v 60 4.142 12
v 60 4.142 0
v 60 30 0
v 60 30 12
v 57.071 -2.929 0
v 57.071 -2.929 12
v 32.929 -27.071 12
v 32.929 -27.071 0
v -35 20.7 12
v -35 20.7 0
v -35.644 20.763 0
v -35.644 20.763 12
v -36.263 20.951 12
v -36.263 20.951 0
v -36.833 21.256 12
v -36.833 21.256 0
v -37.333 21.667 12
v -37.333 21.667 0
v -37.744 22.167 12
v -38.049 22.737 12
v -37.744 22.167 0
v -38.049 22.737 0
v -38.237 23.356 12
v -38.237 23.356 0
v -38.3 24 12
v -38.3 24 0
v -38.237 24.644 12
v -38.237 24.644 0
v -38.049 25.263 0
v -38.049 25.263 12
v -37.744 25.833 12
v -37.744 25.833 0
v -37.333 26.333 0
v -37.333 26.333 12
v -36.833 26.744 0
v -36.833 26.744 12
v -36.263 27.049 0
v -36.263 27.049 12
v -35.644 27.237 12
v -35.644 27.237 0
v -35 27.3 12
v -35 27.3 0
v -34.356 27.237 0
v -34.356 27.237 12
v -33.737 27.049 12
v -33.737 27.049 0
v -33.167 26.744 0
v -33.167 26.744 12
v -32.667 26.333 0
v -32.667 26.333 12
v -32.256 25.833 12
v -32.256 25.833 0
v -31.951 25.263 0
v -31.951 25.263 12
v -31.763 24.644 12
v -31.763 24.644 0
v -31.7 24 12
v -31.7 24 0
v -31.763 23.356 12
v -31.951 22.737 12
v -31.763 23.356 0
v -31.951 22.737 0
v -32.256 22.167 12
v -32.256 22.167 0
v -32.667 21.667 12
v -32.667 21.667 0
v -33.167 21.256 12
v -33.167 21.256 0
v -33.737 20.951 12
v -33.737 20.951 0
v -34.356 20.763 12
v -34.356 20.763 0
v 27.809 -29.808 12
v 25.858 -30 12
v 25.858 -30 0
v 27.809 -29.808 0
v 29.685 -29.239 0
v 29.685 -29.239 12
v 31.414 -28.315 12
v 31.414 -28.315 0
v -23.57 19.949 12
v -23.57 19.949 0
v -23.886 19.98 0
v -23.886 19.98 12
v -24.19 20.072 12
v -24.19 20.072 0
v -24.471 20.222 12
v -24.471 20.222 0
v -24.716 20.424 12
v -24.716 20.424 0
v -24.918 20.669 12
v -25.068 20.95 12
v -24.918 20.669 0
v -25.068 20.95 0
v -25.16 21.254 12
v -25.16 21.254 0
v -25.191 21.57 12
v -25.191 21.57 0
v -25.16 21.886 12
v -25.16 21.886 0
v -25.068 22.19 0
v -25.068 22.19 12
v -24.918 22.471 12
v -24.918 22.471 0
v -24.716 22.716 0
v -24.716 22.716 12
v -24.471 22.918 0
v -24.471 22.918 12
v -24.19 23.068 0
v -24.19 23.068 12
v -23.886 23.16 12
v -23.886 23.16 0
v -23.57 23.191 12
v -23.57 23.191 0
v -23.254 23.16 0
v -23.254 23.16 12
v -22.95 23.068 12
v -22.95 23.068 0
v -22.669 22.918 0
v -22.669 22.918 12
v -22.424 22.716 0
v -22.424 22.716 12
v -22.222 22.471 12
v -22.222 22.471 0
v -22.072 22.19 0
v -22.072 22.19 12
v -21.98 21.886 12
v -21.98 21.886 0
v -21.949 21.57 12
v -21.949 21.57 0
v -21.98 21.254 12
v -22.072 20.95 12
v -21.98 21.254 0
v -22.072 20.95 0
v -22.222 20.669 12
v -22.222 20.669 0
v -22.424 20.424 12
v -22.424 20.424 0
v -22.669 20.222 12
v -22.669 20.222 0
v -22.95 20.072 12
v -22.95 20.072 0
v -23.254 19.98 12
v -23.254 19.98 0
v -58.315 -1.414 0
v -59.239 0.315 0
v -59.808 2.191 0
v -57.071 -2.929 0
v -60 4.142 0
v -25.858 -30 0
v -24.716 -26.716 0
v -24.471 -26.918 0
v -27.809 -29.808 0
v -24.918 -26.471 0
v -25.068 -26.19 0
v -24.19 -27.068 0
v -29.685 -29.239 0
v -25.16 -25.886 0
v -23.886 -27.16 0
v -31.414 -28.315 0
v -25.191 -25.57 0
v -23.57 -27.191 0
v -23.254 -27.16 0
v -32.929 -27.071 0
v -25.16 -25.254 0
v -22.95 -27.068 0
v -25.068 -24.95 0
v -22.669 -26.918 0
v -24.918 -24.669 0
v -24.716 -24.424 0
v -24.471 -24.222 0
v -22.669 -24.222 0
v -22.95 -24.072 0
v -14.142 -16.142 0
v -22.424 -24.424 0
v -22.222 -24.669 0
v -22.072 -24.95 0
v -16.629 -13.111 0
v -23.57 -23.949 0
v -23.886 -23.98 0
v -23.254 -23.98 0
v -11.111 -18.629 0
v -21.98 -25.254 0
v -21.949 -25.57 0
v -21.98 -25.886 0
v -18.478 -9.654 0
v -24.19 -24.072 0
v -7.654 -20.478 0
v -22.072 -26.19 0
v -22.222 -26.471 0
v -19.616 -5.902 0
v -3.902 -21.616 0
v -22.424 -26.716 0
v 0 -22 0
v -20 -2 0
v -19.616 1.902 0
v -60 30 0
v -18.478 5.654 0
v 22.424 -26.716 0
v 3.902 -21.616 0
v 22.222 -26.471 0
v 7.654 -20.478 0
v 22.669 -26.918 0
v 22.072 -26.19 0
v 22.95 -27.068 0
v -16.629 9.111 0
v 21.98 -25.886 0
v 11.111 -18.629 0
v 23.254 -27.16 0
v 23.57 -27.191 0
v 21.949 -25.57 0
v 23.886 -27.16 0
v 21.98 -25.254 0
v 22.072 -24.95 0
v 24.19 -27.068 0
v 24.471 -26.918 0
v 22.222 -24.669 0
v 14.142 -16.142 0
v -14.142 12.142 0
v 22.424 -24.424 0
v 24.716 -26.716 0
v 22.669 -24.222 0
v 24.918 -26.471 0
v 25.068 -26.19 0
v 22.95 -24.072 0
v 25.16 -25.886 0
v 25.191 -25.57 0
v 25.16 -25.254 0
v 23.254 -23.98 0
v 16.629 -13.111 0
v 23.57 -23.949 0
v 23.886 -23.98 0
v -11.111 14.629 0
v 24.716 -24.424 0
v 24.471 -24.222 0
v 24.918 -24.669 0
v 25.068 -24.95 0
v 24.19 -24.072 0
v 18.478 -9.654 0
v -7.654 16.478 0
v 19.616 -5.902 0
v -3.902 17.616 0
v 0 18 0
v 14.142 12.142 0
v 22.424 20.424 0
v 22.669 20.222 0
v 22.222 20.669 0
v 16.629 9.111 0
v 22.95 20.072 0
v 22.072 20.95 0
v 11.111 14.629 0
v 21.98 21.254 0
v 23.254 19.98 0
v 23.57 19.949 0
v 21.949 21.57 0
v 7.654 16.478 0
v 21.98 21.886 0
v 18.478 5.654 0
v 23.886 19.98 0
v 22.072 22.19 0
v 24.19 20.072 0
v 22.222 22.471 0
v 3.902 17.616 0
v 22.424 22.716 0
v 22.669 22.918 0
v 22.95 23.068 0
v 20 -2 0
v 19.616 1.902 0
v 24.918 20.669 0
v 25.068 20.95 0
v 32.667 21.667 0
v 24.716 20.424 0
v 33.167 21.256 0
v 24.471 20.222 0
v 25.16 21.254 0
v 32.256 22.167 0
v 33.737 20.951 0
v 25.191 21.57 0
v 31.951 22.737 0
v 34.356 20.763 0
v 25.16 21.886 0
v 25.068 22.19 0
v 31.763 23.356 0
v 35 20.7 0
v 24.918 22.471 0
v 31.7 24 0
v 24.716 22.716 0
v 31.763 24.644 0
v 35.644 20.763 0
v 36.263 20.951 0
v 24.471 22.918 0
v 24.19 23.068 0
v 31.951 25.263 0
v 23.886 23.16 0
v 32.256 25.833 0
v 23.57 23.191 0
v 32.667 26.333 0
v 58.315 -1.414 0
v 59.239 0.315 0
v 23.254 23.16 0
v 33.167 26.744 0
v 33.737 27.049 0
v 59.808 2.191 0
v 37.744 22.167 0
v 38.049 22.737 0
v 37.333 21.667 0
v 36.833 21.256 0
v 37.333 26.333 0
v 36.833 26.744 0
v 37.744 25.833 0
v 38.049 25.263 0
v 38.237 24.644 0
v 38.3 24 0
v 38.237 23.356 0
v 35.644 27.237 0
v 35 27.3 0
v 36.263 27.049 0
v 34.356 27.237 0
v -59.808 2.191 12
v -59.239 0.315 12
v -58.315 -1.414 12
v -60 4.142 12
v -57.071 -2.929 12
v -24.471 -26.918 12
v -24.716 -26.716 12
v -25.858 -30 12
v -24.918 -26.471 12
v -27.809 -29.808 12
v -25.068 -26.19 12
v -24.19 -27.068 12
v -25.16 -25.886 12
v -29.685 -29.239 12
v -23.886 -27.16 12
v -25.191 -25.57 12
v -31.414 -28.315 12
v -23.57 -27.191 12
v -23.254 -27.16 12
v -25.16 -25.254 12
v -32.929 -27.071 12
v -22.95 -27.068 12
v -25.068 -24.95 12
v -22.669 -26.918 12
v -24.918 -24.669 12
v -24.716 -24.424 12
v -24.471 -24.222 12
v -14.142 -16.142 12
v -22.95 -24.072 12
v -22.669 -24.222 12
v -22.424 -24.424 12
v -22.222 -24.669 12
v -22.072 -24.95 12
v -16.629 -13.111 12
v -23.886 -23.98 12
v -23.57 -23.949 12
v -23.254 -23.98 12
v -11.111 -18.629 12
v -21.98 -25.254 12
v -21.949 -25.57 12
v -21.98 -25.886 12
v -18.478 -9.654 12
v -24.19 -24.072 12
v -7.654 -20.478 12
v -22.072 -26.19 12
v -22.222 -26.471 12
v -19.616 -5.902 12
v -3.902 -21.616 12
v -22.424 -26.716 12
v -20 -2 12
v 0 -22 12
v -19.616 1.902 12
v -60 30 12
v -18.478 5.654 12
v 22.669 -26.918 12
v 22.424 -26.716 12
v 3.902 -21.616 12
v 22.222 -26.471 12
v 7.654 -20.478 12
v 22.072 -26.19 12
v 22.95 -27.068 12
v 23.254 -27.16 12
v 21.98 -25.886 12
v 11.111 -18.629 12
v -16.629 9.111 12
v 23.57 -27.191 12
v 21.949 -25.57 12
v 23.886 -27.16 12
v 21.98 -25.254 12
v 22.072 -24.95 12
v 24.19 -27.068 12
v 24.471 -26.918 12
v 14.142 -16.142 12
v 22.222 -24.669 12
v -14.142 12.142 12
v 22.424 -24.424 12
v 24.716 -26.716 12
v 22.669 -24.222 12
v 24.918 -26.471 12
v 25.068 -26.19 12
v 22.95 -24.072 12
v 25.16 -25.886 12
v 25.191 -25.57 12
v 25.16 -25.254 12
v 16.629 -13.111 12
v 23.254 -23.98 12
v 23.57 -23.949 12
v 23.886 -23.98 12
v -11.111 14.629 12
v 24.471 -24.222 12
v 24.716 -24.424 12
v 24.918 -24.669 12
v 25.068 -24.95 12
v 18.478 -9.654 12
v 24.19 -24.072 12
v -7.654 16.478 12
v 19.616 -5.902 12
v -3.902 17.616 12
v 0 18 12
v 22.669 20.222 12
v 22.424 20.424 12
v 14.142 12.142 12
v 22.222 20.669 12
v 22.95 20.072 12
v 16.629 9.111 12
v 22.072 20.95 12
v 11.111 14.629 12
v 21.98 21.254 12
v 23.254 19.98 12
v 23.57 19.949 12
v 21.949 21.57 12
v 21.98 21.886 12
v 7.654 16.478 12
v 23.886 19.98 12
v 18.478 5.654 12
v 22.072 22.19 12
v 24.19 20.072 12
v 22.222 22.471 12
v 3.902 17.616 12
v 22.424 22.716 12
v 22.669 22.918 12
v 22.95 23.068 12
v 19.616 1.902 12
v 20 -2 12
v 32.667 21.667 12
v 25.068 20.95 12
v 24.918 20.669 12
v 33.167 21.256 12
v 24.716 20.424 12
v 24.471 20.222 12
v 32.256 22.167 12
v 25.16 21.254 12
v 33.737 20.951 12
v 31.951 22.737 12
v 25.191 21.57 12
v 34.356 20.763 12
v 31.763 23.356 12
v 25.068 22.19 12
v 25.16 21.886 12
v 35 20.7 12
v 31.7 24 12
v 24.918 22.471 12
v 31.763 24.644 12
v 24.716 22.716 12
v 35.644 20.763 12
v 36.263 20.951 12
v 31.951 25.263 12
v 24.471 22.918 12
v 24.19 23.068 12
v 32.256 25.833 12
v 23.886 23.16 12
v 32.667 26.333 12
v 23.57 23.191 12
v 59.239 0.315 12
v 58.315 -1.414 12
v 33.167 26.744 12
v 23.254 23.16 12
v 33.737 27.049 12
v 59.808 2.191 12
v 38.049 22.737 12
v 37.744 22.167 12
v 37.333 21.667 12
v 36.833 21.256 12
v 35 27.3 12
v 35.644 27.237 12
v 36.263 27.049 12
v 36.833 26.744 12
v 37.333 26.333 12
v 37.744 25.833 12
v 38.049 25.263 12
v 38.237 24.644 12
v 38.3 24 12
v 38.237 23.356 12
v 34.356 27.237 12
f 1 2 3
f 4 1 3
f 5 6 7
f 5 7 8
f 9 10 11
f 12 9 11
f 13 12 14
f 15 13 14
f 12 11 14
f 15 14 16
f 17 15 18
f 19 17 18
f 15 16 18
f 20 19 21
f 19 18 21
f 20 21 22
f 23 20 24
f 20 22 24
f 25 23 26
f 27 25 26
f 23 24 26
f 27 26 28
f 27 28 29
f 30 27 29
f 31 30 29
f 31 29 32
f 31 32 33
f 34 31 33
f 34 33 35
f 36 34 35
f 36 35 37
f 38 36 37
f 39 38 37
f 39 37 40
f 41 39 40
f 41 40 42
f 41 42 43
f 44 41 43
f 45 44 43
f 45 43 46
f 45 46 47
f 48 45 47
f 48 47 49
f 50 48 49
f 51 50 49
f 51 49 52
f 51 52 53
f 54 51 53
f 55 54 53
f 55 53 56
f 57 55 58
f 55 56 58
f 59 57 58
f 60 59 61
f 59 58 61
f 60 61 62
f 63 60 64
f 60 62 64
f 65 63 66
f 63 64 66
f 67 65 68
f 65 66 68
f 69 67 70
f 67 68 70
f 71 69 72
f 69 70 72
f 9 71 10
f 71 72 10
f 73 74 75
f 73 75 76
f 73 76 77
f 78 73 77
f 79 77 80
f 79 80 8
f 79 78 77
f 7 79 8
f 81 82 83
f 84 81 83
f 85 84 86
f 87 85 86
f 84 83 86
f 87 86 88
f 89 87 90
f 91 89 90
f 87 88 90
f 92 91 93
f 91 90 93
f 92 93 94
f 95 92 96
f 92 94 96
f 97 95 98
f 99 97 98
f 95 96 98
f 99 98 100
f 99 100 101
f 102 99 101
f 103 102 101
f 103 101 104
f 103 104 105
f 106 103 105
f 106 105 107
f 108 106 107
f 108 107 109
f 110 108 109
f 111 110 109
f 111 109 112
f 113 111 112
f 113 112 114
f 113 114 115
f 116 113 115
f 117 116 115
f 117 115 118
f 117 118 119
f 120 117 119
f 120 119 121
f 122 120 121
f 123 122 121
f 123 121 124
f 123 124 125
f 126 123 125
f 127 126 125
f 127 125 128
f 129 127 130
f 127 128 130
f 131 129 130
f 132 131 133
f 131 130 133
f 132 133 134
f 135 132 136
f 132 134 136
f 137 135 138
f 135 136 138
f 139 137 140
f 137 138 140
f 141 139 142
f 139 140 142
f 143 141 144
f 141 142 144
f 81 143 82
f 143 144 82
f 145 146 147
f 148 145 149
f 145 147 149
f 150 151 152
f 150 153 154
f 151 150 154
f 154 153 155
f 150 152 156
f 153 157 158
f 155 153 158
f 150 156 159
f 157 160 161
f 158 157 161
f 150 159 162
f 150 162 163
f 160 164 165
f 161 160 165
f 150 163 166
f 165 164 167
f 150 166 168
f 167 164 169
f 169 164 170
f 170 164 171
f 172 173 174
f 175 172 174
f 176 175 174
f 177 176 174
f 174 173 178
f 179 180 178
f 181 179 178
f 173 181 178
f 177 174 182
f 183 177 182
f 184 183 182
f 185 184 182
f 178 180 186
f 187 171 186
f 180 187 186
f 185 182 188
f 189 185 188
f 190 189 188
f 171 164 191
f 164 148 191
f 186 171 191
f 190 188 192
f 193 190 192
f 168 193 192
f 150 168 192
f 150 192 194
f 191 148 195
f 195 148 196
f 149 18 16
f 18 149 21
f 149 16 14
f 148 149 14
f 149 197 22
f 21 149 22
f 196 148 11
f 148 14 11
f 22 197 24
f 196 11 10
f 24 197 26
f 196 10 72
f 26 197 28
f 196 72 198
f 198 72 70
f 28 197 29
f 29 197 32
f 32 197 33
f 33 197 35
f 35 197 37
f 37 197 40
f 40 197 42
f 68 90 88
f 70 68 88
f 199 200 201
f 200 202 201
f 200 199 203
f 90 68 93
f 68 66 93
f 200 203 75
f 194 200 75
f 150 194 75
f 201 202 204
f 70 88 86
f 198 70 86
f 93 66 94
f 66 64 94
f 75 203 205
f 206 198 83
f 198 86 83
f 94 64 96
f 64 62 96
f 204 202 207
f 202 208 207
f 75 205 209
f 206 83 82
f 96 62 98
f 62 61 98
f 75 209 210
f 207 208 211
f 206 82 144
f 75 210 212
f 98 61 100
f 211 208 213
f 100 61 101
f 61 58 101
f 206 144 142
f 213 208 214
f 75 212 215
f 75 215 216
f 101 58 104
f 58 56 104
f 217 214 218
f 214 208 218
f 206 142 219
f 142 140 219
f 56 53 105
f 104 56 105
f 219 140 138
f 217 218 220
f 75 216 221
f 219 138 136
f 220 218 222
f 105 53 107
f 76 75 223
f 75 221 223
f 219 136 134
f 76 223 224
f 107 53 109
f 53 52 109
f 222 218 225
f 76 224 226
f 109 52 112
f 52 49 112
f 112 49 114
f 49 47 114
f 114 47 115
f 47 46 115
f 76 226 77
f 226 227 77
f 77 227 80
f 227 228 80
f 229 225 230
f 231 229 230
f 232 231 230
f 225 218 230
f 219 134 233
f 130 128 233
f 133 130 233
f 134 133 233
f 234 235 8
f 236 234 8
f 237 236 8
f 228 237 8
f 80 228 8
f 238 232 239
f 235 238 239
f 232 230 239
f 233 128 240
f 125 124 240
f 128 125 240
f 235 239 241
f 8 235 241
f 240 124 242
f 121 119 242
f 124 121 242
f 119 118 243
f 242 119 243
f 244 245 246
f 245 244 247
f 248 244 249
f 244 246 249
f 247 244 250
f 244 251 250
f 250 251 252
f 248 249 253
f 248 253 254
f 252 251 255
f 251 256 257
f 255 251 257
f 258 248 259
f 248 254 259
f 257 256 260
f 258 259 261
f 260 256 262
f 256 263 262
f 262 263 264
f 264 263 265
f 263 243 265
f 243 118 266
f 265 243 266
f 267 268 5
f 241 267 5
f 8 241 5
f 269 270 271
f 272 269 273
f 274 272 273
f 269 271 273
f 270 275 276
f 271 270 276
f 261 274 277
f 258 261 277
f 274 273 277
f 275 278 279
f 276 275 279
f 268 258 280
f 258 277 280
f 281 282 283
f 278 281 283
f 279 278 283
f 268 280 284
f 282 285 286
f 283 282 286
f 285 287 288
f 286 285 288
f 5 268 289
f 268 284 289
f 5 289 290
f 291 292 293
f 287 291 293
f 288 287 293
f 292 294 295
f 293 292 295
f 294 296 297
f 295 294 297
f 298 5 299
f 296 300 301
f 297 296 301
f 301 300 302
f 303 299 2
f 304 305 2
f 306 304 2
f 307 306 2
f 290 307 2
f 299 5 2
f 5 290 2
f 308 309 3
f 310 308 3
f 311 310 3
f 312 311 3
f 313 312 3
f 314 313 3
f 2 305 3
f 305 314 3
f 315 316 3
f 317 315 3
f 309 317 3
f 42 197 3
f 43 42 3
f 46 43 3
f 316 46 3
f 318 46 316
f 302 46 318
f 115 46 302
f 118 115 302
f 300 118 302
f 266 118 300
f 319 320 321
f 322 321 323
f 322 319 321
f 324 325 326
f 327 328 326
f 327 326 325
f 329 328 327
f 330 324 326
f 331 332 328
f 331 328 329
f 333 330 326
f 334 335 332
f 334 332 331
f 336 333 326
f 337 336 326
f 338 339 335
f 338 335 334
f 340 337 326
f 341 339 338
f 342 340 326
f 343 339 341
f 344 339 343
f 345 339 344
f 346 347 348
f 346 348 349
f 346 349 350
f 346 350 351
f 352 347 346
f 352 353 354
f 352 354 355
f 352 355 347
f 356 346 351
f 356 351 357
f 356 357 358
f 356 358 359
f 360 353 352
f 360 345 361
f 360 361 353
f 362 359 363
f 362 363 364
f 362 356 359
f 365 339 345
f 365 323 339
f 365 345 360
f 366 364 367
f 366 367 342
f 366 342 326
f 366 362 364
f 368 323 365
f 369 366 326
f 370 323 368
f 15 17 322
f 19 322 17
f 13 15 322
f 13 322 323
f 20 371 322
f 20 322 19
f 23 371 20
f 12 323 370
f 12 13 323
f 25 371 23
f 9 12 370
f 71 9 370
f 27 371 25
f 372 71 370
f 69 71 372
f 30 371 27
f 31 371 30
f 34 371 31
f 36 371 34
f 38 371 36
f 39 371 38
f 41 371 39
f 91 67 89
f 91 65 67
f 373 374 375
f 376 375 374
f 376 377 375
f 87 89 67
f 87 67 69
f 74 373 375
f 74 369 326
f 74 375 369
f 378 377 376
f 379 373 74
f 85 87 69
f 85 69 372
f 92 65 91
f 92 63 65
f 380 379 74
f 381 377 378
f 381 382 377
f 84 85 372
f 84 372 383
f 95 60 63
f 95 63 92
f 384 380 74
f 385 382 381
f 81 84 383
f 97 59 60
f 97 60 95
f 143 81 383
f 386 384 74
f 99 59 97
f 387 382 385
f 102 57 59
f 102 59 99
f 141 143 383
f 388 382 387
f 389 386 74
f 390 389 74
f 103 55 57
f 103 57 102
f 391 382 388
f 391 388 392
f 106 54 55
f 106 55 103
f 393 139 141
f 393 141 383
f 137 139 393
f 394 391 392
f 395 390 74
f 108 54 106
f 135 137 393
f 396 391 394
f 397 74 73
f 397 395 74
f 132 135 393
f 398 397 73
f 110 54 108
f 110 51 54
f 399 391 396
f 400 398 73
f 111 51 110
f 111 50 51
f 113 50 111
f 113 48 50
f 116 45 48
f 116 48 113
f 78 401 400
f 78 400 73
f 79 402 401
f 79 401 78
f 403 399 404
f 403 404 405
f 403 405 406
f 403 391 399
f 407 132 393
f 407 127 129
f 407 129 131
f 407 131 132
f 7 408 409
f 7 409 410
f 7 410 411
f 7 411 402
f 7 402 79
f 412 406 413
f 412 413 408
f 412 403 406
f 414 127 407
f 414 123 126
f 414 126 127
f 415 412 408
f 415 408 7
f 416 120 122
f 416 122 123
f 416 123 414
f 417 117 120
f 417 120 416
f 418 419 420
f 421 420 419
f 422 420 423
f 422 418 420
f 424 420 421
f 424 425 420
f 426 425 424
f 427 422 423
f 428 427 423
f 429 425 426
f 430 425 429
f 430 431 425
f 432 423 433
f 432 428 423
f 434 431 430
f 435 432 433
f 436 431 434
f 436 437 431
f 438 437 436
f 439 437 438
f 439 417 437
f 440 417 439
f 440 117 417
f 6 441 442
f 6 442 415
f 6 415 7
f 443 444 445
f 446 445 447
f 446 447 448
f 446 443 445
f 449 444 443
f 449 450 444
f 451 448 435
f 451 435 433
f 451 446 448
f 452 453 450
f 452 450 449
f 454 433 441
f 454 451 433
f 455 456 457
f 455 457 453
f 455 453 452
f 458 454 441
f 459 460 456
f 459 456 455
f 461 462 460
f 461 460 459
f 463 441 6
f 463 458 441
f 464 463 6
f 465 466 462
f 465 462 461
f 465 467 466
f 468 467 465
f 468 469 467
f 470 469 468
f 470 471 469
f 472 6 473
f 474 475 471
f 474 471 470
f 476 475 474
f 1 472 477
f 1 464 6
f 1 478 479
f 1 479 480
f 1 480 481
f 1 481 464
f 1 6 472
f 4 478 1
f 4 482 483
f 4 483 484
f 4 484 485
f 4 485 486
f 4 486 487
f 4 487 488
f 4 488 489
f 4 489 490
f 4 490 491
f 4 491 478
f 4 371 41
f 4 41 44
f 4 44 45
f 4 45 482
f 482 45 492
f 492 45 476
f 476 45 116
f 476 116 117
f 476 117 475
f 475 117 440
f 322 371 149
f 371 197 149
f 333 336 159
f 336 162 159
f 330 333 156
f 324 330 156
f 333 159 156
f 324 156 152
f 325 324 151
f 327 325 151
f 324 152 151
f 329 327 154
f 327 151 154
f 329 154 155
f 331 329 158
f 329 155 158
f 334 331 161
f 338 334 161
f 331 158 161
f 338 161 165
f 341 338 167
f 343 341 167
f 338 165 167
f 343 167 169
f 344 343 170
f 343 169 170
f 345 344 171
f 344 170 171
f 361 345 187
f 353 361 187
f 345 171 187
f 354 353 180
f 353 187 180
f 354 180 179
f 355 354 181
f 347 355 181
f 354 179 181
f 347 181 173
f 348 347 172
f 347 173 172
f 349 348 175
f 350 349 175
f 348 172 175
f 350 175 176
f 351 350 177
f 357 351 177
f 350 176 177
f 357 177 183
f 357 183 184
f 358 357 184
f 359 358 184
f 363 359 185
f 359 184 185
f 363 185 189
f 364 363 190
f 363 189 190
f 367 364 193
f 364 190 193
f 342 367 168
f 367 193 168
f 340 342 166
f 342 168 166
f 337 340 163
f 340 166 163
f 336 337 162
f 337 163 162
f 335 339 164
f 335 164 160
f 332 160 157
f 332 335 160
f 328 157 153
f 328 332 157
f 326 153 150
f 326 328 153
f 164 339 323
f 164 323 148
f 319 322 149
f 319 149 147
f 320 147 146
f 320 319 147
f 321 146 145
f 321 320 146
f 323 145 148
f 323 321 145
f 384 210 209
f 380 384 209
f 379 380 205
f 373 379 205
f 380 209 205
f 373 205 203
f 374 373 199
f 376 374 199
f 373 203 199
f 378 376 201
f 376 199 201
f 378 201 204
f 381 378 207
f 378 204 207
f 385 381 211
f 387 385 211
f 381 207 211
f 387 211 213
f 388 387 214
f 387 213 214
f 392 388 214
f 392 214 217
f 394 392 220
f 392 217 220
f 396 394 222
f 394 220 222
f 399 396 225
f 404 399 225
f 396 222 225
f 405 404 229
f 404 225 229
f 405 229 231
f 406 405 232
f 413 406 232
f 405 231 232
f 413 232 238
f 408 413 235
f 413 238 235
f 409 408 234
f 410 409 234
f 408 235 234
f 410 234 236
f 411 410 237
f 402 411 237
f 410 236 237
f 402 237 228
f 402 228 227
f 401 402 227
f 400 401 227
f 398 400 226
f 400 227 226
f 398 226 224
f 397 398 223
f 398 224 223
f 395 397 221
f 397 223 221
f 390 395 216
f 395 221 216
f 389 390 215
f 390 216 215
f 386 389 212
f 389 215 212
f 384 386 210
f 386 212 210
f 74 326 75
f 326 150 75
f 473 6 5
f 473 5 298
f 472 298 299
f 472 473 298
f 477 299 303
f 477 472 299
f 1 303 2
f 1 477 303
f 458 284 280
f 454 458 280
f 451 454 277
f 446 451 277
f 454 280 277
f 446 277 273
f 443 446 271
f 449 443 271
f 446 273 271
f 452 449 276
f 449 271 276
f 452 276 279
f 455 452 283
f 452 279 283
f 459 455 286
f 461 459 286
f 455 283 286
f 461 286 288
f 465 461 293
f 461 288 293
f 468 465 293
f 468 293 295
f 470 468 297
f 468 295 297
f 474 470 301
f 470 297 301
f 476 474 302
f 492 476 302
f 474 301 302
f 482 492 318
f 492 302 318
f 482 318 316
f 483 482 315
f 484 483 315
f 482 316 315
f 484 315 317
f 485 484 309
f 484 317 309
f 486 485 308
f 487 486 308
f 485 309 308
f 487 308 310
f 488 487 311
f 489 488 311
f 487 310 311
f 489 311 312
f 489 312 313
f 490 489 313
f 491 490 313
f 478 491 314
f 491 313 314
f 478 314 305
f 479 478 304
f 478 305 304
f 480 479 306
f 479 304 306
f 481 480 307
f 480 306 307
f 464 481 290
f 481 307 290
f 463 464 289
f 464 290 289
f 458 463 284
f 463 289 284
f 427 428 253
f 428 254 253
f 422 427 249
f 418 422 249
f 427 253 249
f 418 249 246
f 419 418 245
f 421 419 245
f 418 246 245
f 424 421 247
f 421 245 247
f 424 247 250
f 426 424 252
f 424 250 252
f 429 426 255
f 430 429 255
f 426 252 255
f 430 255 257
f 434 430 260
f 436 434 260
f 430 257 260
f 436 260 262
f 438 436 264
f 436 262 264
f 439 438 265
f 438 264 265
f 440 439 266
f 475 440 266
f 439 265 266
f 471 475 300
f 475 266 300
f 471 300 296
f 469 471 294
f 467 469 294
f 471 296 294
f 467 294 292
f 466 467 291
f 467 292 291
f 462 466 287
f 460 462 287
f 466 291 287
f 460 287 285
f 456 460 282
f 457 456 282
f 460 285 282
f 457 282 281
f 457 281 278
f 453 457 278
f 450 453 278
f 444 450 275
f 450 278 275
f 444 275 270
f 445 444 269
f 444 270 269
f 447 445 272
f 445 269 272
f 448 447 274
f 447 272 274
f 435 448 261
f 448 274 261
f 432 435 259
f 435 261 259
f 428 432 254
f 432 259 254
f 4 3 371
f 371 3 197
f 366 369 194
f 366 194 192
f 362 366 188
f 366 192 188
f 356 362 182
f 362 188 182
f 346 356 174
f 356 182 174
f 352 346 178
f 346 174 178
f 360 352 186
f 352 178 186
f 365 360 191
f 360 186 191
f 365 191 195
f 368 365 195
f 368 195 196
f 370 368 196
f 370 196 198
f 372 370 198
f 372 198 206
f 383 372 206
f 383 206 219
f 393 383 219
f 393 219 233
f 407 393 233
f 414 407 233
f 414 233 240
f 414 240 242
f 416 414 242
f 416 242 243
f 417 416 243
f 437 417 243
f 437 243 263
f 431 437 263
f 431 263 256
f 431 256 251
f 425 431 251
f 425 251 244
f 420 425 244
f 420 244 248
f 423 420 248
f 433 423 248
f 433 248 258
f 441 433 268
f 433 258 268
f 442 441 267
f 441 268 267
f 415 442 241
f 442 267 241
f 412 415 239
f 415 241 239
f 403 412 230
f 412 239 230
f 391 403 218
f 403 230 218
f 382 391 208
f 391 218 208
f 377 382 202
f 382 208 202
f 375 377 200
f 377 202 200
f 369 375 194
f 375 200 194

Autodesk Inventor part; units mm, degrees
ref_plane "YZ Plane" through (0, 0, 0) normal (1, 0, 0) x (0, 1, 0)
ref_plane "XZ Plane" through (0, 0, 0) normal (0, 1, 0) x (-1, 0, 0)
ref_plane "XY Plane" through (0, 0, 0) normal (0, 0, 1) x (1, 0, 0)
sketch "Sketch1" plane through (0, 0, 0) normal (0, 0, 1) x (1, 0, 0)
  line L0 (-60, -30) -> (60, -30)
  line L1 (60, -30) -> (60, 30)
  line L2 (60, 30) -> (-60, 30)
  line L3 (-60, 30) -> (-60, -30)
  line L4 (-60, -30) -> (60, 30) construction
  line L5 (60, -30) -> (-60, 30) construction
  point P0 (0, 0)
  dimension "d0" = 120
  dimension "d1" = 60
extrude "Extrusion1" add sketch "Sketch1" along normal blind 12
sketch "Sketch2" plane through (0, 0, 12) normal (0, 0, 1) x (1, 0, 0)
  line L0 (60, 30) -> (-60, 30) projected
  point P0 (0, 0)
  point P1 (0, -2)
  point P2 (0, 30)
  dimension "d4" = 32
hole "Hole1" at (0, -2, 12) direction (0, 0, -1) diameter 40 end through all
chamfer "Chamfer1" distance 30 angle 45 2 edges at (60, -30, 6) (-60, -30, 6)
sketch "Sketch3" plane through (0, 0, 12) normal (0, 0, 1) x (1, 0, 0)
  line L0 (60, 30) -> (-60, 30) projected
  point P0 (0, 0)
  point P1 (-35, 24)
  point P2 (35, 24)
  dimension "d15" = 6
  dimension "d16" = 70
  dimension "d17" = 35
hole "Hole2" at (-35, 24, 12) at (35, 24, 12) direction (0, 0, -1) diameter 6.6 end through all clearance for "Socket Head Cap Screw ISO 4762" size "M6" standard "ISO"
sketch "Sketch4" plane through (0, 0, 12) normal (0, 0, 1) x (1, 0, 0)
  line L0 (-23.57, -25.57) -> (23.57, -25.57)
  line L1 (23.57, -25.57) -> (23.57, 21.57)
  line L2 (23.57, 21.57) -> (-23.57, 21.57)
  line L3 (-23.57, 21.57) -> (-23.57, -25.57)
  line L4 (-23.57, -25.57) -> (23.57, 21.57) construction
  line L5 (23.57, -25.57) -> (-23.57, 21.57) construction
  circle A0 centre (0, -2) radius 20 projected
  dimension "d25" = 47.14
  dimension "d26" = 47.14
hole "Hole3" at (-23.57, 21.57, 12) at (23.57, 21.57, 12) at (23.57, -25.57, 12) at (-23.57, -25.57, 12) direction (0, 0, -1) diameter 3.242 end through all thread size "M4x0.7" designation "M4" class "6H" standard "ISO Metric profile"
fillet "Fillet1" radius 10 4 edges at (-30, -30, 6) (-60, 0, 6) (30, -30, 6) (60, 0, 6)
equation "\"d17\" = 0.5 * d16"
properties part number "Motorhalterung" material "Aluminum 6061"
